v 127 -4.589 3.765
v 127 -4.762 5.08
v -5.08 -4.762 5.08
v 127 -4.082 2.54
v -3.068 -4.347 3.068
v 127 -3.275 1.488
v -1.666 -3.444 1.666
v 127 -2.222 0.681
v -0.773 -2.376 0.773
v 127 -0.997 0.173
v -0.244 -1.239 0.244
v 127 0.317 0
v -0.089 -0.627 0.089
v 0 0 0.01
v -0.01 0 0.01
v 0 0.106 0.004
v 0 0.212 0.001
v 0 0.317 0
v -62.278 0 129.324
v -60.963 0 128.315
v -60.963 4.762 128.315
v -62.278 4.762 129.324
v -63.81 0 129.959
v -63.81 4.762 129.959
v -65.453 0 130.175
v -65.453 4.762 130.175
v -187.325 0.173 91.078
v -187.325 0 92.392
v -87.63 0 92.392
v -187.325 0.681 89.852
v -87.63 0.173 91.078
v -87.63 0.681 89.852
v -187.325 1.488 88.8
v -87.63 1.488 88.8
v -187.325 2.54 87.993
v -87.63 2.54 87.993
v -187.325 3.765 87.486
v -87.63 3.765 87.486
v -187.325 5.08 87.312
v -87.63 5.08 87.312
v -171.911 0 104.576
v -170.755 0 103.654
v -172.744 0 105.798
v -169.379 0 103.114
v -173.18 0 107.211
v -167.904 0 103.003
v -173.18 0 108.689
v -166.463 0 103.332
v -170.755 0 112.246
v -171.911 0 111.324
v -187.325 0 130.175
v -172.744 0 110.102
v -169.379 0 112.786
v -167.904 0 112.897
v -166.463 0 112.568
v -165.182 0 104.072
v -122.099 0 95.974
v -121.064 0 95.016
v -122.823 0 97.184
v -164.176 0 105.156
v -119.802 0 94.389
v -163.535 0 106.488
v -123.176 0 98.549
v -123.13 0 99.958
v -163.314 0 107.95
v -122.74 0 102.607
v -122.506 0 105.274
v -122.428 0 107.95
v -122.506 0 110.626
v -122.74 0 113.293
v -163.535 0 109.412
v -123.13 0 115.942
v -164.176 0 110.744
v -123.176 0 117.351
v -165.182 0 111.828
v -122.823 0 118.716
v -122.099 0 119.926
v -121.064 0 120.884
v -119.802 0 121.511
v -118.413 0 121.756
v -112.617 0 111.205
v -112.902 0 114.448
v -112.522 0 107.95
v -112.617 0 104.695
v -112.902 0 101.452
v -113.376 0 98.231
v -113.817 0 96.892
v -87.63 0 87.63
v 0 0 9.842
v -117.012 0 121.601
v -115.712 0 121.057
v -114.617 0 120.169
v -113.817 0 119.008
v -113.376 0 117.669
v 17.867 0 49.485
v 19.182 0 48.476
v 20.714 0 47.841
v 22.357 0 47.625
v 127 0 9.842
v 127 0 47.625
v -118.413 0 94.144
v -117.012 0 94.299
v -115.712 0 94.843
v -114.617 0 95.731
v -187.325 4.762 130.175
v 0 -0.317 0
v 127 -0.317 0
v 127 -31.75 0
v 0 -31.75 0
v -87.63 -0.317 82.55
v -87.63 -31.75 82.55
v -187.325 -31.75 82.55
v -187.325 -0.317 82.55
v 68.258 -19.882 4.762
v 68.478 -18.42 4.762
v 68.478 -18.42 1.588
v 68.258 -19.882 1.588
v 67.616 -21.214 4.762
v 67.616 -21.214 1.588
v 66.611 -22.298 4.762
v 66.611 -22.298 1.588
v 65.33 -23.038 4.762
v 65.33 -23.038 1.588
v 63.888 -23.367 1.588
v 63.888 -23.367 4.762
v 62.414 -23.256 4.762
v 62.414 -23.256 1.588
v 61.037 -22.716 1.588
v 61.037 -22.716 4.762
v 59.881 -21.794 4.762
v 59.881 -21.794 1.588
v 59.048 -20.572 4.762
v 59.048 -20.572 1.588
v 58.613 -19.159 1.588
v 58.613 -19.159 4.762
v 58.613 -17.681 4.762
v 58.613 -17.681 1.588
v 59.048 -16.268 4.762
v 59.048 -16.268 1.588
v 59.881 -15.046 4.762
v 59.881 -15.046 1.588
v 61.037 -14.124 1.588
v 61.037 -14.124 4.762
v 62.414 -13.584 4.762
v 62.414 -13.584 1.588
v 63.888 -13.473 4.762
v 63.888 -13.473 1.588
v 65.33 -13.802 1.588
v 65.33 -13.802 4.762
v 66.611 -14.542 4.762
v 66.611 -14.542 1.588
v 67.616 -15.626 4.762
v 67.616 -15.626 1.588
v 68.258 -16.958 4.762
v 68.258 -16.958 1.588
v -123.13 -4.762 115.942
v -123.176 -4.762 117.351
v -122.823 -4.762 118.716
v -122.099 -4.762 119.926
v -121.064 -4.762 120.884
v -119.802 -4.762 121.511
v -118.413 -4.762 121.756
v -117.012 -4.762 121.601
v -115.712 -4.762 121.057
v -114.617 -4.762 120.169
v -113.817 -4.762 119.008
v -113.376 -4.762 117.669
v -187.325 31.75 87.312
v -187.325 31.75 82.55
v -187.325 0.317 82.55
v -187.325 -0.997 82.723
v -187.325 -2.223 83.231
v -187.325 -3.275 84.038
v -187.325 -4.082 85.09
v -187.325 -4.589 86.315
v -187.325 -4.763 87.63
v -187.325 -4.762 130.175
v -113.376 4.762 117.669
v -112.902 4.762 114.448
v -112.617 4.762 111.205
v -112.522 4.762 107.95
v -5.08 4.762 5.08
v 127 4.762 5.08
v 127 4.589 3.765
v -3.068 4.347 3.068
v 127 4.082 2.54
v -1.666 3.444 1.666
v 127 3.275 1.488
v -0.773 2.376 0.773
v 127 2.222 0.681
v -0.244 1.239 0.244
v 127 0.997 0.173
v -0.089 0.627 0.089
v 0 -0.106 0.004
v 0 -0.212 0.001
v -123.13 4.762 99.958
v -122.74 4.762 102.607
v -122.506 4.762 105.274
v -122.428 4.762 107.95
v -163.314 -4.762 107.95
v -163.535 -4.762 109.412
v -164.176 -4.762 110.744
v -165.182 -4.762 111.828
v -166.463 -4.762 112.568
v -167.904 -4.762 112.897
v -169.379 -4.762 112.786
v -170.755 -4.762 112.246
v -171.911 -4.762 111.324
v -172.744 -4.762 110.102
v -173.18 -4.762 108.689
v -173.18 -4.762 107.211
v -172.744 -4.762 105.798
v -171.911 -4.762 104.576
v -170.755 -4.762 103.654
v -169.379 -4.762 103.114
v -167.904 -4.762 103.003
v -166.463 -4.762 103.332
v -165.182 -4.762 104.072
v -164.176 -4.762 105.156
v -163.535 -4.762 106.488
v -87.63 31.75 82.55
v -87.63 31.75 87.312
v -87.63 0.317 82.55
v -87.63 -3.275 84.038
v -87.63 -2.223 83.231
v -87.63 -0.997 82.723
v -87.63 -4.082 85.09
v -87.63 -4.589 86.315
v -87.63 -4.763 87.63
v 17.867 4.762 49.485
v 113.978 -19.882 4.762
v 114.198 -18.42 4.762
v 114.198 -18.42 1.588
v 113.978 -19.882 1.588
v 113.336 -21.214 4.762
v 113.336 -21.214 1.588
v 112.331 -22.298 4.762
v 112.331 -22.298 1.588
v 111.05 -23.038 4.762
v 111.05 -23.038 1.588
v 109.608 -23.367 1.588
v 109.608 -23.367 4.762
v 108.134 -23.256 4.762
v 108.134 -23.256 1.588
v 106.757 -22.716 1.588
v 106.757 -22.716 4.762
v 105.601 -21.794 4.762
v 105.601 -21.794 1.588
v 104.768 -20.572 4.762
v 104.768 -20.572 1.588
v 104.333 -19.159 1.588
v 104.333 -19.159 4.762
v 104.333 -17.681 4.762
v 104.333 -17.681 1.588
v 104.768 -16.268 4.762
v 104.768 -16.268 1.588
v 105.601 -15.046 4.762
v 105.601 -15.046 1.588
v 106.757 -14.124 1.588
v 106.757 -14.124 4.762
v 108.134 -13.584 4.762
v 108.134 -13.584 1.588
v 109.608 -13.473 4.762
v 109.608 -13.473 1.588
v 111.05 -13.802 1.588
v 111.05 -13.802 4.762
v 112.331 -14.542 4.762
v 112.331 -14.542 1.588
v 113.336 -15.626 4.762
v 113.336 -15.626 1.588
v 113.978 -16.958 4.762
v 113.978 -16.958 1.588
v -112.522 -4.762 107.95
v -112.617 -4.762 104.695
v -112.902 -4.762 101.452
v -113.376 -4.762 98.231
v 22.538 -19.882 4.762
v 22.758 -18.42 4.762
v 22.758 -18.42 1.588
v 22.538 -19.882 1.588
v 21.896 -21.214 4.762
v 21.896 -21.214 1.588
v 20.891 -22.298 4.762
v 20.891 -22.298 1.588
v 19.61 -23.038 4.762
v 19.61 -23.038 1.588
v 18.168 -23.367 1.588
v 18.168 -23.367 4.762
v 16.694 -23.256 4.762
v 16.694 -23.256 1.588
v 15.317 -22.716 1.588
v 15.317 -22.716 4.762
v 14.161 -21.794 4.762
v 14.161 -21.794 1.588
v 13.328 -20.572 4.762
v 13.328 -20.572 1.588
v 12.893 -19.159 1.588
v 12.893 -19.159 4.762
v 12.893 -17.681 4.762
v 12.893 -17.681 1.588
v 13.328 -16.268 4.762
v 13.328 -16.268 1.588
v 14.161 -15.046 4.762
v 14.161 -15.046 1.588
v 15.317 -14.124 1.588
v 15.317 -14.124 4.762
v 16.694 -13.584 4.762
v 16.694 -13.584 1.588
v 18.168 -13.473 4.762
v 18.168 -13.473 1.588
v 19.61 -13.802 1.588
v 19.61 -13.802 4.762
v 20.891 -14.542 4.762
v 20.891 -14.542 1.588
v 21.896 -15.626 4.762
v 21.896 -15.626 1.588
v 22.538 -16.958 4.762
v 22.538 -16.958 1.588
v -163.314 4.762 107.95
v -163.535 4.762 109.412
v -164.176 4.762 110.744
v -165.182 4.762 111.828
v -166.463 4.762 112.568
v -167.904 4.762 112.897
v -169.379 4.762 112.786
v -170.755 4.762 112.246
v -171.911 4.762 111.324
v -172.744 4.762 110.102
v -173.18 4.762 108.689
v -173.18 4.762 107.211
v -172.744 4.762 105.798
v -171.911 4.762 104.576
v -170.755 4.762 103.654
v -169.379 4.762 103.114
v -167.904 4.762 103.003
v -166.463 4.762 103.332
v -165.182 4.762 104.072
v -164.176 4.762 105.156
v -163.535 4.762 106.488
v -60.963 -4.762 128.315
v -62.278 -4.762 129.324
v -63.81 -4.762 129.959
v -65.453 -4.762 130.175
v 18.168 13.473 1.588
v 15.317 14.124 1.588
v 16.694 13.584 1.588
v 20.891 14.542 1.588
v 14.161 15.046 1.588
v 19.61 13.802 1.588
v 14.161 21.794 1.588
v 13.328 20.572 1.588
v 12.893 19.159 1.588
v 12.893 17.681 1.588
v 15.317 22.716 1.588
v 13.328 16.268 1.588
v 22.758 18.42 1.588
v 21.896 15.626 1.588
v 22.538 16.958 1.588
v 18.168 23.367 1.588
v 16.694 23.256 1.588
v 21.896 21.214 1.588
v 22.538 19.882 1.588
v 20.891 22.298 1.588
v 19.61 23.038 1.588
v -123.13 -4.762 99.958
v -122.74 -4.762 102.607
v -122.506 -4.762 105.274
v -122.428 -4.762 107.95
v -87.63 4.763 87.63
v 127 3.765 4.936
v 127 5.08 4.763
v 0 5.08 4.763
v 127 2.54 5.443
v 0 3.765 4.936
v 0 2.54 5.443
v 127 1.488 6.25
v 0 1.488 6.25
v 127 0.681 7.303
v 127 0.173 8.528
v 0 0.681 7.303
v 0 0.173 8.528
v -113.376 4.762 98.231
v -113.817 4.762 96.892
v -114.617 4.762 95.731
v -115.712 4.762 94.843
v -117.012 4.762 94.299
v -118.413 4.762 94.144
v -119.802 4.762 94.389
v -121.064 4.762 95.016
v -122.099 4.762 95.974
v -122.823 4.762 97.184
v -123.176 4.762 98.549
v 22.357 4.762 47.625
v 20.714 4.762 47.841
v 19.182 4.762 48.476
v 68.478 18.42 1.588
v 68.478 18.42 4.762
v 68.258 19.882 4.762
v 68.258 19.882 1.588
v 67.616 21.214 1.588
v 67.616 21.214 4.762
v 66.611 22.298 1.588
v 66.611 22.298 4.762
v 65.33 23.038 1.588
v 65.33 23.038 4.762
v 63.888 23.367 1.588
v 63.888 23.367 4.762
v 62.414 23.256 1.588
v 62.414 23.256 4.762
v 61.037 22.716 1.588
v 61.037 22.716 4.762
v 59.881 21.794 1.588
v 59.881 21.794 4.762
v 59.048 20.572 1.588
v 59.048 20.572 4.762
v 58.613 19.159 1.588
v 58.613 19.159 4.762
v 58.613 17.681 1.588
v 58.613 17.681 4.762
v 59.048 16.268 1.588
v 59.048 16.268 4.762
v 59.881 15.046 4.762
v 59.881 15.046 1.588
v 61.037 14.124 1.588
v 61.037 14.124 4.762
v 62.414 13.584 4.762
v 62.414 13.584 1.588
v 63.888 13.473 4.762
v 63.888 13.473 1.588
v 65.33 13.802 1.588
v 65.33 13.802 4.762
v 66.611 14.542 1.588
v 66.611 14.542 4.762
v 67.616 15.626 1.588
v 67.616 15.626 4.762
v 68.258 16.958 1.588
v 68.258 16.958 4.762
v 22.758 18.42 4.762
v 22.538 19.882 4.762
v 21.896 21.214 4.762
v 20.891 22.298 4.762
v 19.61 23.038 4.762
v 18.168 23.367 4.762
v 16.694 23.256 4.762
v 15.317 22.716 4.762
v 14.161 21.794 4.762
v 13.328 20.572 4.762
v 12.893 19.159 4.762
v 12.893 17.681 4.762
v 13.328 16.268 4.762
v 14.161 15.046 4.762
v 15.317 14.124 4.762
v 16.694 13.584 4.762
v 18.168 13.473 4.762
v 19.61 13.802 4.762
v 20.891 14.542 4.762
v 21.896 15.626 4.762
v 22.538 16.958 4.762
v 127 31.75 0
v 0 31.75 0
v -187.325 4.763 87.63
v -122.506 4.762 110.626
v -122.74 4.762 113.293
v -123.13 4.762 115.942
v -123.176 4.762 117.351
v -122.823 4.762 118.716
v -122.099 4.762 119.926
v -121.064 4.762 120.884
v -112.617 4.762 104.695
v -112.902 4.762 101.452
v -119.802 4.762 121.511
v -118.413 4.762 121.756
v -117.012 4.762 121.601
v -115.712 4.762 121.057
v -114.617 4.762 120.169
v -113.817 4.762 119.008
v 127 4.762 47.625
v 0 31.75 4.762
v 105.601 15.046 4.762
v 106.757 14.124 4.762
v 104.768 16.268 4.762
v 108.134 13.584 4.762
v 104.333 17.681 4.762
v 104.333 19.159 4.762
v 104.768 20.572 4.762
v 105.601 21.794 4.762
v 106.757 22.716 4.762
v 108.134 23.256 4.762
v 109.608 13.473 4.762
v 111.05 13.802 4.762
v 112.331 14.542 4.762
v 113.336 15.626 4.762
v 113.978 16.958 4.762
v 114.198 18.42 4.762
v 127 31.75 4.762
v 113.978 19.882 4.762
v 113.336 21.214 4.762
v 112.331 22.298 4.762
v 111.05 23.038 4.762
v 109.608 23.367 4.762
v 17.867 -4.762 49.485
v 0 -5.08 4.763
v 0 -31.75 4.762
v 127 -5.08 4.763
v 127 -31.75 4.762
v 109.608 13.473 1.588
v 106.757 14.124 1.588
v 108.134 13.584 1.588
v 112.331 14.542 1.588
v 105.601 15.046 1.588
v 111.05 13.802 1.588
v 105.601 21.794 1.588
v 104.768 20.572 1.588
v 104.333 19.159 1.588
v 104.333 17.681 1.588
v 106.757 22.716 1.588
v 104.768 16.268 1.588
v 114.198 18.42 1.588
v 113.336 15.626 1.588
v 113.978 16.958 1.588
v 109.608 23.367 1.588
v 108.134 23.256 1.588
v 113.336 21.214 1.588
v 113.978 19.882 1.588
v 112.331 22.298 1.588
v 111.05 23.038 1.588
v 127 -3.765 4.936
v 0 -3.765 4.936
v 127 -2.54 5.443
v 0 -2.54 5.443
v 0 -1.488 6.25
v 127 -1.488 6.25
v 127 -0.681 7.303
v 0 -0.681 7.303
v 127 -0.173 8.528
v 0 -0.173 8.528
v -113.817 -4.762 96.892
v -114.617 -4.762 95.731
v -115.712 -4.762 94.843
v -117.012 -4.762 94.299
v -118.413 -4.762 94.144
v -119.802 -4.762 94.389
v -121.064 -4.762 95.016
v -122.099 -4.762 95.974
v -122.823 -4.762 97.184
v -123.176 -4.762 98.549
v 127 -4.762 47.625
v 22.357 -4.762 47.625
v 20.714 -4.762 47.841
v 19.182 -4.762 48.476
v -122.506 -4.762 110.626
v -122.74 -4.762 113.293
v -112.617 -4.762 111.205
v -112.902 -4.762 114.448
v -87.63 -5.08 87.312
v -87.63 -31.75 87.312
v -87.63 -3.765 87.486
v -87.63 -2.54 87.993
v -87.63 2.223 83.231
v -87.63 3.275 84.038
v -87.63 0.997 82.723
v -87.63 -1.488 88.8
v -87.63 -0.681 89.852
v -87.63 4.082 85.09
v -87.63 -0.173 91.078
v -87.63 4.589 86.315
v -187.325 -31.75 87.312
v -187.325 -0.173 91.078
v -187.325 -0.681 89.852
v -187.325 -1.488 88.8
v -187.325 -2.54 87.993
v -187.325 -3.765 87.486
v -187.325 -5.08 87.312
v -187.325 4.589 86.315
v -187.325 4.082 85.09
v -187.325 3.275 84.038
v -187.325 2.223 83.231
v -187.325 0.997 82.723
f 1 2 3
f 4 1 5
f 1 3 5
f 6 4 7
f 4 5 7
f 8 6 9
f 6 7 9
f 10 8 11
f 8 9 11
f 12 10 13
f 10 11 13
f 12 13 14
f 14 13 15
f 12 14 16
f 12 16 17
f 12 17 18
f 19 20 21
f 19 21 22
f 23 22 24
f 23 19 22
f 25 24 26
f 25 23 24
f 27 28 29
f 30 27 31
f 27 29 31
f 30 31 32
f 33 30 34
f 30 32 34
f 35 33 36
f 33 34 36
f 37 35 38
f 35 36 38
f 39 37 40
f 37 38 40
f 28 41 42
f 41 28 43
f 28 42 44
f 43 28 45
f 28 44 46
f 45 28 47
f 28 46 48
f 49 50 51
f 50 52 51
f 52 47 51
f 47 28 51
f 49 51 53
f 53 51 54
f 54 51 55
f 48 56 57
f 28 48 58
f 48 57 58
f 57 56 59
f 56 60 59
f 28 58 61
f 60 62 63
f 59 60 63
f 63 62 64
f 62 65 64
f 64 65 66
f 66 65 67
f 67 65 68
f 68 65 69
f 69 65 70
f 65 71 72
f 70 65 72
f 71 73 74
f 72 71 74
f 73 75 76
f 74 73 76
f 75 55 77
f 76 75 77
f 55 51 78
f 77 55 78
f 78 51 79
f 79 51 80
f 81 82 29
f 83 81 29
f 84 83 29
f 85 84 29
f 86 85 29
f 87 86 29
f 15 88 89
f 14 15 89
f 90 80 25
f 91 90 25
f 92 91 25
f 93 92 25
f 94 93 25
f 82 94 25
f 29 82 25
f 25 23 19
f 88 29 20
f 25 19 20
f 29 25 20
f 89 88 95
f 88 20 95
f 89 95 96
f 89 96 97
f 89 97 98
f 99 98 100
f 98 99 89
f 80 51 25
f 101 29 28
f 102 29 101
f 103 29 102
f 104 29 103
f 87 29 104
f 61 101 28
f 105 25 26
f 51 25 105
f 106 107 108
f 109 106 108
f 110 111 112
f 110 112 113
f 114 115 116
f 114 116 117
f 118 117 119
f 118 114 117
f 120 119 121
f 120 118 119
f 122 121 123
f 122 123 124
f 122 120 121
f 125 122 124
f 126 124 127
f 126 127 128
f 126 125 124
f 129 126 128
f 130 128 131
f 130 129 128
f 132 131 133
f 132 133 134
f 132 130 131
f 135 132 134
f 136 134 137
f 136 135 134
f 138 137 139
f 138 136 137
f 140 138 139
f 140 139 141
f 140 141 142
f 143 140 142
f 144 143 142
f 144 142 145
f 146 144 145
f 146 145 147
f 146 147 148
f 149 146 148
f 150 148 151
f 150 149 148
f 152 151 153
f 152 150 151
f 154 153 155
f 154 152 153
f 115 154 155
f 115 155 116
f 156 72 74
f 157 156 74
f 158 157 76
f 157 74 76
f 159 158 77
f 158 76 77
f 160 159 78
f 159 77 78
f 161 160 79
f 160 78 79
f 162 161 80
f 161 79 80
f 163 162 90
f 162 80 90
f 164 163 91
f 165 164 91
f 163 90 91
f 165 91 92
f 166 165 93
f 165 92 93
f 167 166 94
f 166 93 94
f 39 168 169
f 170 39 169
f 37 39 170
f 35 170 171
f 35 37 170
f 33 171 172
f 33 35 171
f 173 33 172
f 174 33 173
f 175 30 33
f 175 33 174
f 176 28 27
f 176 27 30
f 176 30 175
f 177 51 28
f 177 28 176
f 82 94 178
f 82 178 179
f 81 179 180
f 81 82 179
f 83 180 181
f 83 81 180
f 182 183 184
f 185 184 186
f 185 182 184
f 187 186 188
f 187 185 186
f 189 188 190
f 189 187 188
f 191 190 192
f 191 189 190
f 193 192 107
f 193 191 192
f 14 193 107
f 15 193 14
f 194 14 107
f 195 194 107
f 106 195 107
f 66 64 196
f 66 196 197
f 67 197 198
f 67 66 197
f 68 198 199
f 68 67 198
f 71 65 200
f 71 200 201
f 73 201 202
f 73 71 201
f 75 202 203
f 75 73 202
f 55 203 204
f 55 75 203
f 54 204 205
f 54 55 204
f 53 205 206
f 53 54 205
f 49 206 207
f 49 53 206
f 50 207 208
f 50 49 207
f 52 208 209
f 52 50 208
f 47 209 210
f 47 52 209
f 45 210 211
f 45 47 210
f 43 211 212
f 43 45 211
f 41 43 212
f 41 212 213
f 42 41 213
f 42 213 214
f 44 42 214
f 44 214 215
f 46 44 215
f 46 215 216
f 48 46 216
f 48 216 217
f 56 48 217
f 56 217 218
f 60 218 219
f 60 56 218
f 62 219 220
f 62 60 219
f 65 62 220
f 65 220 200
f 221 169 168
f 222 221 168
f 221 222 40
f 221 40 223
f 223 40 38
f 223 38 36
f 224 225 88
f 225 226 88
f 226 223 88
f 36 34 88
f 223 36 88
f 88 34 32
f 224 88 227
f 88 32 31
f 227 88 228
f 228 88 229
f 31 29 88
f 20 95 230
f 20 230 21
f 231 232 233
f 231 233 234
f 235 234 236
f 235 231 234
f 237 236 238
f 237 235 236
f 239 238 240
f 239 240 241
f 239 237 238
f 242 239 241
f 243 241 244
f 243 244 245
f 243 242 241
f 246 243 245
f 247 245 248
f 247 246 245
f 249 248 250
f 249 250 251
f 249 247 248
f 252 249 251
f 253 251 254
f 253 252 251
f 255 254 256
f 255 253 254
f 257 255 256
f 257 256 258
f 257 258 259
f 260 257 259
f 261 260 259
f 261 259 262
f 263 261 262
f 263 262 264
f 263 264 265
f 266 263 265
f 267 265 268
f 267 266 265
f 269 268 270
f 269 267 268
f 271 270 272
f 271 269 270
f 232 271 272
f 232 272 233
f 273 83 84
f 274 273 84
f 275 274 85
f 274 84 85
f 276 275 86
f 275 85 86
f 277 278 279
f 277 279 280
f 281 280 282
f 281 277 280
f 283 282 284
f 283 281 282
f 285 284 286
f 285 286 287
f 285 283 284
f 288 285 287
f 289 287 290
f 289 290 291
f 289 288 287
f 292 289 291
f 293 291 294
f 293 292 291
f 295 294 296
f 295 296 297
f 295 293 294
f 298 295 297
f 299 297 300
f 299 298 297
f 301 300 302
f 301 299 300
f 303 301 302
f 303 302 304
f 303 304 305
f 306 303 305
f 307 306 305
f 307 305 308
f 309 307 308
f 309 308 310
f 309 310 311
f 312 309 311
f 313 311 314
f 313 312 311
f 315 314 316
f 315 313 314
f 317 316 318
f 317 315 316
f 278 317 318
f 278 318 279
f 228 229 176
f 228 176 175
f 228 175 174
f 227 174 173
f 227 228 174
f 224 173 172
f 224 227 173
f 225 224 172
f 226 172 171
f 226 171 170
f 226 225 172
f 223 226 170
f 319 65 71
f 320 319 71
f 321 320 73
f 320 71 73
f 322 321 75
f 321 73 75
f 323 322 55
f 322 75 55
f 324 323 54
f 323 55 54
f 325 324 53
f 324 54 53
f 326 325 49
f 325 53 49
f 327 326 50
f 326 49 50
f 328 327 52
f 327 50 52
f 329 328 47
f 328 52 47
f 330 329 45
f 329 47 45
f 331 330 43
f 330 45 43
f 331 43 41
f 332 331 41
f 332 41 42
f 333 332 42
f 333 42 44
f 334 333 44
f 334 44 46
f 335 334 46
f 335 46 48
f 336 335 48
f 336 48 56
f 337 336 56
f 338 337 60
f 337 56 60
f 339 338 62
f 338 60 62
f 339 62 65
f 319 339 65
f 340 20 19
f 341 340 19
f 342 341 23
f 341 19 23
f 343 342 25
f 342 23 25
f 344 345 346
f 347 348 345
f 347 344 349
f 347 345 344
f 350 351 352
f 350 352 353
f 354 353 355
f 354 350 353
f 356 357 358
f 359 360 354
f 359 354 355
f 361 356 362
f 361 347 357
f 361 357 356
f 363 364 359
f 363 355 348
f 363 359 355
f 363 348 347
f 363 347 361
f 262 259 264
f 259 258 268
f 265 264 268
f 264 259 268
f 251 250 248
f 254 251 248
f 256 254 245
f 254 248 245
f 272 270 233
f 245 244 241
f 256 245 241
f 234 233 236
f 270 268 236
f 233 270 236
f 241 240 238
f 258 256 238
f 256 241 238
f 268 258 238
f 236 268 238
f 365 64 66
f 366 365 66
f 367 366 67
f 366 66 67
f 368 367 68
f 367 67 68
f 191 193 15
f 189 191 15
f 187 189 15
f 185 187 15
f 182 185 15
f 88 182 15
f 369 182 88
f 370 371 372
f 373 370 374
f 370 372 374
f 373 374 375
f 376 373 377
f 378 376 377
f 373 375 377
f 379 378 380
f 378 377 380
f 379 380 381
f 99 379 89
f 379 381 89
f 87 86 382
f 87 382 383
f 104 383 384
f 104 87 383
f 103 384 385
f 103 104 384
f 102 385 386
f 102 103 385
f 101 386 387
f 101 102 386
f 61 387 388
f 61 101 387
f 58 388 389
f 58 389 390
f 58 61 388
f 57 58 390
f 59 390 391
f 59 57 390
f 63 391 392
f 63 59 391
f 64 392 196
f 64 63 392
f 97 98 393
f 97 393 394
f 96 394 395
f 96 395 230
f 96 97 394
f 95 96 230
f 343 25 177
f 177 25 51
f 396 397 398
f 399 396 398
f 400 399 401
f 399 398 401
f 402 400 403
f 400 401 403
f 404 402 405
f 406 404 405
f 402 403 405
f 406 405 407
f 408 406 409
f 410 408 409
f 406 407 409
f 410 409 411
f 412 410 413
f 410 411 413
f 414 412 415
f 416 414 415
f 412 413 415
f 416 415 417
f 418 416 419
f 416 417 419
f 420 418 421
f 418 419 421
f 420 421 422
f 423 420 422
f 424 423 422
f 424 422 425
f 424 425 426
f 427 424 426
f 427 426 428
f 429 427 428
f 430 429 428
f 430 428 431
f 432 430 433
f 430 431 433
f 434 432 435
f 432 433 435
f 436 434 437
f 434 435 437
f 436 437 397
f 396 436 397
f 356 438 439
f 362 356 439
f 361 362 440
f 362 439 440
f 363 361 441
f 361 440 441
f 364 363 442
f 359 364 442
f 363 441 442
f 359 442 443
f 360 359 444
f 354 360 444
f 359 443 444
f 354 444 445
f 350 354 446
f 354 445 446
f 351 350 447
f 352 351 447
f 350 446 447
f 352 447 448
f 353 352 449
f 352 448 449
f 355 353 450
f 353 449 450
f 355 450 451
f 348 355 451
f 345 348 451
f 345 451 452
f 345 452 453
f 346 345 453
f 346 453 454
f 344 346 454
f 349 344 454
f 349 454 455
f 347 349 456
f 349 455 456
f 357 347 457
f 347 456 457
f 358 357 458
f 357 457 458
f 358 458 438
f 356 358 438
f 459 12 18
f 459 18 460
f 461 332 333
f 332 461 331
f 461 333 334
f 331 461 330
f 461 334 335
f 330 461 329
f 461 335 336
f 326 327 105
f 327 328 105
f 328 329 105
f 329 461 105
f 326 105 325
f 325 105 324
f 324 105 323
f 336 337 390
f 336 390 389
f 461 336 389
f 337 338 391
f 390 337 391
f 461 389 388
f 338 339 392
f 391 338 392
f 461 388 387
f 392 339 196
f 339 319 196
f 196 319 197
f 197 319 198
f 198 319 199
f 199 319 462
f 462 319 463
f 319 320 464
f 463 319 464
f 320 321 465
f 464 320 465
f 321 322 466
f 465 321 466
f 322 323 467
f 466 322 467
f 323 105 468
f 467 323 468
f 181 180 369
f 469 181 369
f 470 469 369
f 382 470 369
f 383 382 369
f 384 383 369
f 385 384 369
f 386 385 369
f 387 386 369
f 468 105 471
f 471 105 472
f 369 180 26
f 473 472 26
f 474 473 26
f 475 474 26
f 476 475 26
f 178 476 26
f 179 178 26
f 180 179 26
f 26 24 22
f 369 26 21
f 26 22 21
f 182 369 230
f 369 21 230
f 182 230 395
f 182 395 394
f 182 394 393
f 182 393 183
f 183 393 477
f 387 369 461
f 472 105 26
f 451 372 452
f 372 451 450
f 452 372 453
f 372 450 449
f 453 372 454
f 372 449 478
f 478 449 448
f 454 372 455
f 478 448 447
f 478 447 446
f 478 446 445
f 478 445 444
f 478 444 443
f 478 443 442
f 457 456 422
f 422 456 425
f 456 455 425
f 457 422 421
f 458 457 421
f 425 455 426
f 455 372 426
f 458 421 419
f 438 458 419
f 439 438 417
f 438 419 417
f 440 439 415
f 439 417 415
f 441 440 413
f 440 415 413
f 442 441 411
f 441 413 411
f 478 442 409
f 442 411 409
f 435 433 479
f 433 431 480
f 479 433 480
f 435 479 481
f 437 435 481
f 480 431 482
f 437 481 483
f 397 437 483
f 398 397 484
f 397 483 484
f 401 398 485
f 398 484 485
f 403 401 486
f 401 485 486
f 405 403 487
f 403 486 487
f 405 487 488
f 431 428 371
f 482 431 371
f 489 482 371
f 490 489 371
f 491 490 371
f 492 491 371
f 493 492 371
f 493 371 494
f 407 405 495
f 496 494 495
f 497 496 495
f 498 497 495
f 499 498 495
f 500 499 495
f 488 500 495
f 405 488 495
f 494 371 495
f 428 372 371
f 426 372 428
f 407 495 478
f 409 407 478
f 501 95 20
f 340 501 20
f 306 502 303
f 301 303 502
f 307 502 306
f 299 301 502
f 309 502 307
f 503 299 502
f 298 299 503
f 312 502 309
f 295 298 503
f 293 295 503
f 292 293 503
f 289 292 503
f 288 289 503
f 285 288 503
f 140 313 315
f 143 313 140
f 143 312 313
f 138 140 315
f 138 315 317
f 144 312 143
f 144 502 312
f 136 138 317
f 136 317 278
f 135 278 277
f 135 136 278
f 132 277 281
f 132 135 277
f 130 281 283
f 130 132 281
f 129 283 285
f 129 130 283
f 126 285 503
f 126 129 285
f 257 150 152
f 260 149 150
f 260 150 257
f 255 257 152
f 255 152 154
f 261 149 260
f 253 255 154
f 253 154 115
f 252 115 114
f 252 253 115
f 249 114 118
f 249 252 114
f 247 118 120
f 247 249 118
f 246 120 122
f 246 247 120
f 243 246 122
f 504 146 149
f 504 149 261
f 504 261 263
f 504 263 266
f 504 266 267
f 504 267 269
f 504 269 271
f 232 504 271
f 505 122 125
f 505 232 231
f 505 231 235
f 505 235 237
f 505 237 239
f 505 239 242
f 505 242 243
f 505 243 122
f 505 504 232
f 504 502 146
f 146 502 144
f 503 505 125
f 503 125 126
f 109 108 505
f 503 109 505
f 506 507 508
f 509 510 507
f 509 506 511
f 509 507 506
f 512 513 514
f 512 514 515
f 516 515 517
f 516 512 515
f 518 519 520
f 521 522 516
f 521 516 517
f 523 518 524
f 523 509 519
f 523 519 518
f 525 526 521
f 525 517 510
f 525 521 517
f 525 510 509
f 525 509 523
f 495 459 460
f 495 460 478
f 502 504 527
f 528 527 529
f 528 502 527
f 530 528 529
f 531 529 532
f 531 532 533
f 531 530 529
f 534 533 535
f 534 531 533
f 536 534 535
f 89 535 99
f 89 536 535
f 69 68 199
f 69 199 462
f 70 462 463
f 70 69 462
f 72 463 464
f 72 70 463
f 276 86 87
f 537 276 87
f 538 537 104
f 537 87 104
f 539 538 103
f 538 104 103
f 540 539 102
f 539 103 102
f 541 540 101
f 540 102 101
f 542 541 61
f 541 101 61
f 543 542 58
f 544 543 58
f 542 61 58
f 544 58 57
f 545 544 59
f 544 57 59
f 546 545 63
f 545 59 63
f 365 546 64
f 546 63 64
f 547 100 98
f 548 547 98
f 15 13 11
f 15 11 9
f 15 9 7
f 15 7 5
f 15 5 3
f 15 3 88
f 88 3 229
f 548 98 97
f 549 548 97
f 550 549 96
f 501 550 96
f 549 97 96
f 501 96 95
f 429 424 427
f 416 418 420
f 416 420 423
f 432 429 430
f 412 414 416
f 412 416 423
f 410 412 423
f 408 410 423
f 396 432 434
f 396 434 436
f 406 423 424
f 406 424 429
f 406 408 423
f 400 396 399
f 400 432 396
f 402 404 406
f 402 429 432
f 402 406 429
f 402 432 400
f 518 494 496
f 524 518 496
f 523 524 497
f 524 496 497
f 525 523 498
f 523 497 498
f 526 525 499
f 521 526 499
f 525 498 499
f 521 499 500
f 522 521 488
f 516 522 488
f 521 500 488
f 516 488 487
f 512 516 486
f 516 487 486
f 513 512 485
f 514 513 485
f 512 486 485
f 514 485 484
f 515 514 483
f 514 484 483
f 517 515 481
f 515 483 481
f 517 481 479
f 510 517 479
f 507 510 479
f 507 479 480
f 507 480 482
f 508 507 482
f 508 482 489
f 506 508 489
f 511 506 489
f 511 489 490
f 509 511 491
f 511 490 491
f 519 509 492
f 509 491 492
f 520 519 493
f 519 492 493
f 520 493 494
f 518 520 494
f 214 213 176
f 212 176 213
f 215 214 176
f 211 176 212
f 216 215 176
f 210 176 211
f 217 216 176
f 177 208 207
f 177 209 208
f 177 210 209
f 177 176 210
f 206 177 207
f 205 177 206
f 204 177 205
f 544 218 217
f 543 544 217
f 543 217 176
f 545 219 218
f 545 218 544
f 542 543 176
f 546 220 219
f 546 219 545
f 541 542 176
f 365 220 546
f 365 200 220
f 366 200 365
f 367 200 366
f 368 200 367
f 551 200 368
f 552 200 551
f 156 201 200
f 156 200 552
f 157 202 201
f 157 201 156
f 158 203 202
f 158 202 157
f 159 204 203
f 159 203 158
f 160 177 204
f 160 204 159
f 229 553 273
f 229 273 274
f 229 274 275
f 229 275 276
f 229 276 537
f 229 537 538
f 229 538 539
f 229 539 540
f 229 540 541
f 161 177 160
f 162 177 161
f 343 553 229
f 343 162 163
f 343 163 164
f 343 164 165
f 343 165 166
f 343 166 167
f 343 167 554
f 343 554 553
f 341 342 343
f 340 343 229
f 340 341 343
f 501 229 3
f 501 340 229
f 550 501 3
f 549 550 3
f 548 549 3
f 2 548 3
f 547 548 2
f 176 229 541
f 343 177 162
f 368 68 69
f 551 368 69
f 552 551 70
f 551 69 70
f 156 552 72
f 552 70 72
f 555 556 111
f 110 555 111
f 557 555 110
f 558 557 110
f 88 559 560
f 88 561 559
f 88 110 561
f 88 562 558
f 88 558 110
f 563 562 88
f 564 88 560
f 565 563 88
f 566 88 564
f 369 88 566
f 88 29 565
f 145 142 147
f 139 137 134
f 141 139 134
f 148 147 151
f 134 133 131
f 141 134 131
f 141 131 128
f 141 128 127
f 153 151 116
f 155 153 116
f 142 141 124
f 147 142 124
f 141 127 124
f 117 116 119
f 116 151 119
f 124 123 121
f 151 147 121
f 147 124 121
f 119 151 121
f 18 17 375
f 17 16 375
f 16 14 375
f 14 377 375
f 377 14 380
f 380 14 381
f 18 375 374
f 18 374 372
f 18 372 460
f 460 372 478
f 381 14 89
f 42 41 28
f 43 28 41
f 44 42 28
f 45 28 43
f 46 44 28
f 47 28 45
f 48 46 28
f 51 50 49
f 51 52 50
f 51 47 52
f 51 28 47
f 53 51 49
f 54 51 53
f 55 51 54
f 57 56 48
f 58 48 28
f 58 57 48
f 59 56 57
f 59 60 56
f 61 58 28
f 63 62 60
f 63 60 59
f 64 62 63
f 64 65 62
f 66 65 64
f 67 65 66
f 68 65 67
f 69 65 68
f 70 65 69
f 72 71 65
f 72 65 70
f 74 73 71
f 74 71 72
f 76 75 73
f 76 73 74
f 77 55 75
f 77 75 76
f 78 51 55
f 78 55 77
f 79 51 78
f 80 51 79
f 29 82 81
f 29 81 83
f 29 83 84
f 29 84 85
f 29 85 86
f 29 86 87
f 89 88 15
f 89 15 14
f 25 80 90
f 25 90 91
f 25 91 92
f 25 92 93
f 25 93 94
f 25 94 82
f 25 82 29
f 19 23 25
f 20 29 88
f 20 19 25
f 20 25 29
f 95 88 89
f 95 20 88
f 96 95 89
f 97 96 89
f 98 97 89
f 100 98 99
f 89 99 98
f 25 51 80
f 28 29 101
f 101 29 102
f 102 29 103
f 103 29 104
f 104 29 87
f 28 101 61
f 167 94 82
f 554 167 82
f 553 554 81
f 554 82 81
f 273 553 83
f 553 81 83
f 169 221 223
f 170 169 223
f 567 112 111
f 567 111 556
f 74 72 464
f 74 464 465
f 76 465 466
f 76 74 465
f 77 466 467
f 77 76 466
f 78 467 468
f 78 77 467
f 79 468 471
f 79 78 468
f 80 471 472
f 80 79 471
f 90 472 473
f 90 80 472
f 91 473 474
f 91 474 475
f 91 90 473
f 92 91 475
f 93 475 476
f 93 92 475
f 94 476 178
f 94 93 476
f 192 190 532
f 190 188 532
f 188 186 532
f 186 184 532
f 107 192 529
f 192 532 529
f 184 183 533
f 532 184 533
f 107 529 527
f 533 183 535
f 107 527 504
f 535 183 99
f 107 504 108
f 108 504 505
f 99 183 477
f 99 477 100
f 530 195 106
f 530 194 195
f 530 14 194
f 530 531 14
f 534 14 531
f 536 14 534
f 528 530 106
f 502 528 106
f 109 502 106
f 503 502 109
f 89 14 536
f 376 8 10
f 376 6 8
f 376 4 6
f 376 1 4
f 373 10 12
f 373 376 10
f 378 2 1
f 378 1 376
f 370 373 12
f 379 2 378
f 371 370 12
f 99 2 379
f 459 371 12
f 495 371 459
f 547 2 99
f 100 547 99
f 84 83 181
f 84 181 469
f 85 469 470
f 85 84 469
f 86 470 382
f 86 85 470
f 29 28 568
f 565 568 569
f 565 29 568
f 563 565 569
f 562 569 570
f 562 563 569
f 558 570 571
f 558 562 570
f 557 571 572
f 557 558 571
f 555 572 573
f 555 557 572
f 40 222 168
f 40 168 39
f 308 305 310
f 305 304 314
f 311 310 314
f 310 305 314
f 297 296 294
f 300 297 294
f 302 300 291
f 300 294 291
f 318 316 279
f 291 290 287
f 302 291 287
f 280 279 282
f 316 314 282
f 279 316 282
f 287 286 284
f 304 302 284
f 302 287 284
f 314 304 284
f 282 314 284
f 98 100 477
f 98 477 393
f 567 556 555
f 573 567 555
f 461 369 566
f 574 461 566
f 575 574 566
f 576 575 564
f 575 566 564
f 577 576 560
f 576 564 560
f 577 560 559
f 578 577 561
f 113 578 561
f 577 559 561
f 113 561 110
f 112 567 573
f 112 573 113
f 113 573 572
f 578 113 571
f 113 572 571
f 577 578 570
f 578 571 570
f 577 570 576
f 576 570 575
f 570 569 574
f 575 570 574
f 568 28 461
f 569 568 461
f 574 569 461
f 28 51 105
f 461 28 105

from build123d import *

# Parameters (mm, degrees)
F0_R        = 4.96062
F1_DEPTH    = 4.7625
F2_W        = 31.75
F2_H        = 4.7625
F3_DEPTH    = 127
F4_T1_DEPTH = 127
F4_T3_DEPTH = 152.4
F5_R        = 4.96062
F6_DEPTH    = 3.175
F7_W        = 31.75
F7_H        = 4.7625
F8_DEPTH    = 99.695
F9_R        = 5.08
F11_DEPTH   = 25.4


# Not quite as in the source:
# - a fillet or chamfer that OpenCascade refuses, or shapes differently, is made with other operations: its cross-section is extruded or revolved along the edge and cut away or added


with BuildPart() as f1:
    # F0 (on Front) → F1 (new body)
    with BuildSketch(Plane.XZ):
        with BuildLine():
            Line((-82.55, 82.55), (0, 0))
            Line((0, 0), (127, 0))
            Line((127, 0), (127, 47.625))
            Line((127, 47.625), (22.3571770291, 47.625))
            ThreePointArc((22.3571770291, 47.625), (19.9271372336, 48.1083649686), (17.8670489686, 49.4848719395))
            Line((17.8670489686, 49.4848719395), (-60.9632071525, 128.3151280605))
            ThreePointArc((-60.9632071525, 128.3151280605), (-63.0232954175, 129.6916350314), (-65.4533352131, 130.175))
            Line((-65.4533352131, 130.175), (-187.325, 130.175))
            Line((-187.325, 130.175), (-187.325, 82.55))
            Line((-187.325, 82.55), (-82.55, 82.55))
        make_face()
        with Locations((-168.275, 107.95)):
            Circle(F0_R, mode=Mode.SUBTRACT)
        with BuildLine():
            ThreePointArc((-113.3757178125, 117.6693530802), (-112.7358395418, 112.8283875), (-112.522, 107.95))
            ThreePointArc((-112.522, 107.95), (-112.7358395418, 103.0716125), (-113.3757178125, 98.2306469198))
            ThreePointArc((-113.3757178125, 98.2306469198), (-119.1163255014, 94.2169402337), (-123.1300321875, 99.9575479227))
            ThreePointArc((-123.1300321875, 99.9575479227), (-122.6038452724, 103.9383875), (-122.428, 107.95))
            ThreePointArc((-122.428, 107.95), (-122.6038452724, 111.9616125), (-123.1300321875, 115.9424520773))
            ThreePointArc((-123.1300321875, 115.9424520773), (-119.1163255014, 121.6830597663), (-113.3757178125, 117.6693530802))
        make_face(mode=Mode.SUBTRACT)
    extrude(amount=F1_DEPTH)

    # F2 (on face) → F3 (join)
    with BuildSketch(Plane.YZ.offset(127)):
        with Locations((15.875, 2.38125)):
            Rectangle(F2_W, F2_H)
    extrude(amount=-F3_DEPTH)

    # F4: fillet of radius 5.08 on 2 edges, made by hand

    # F4_s2 → F4_t1 (join)
    with BuildSketch(Plane.YZ):
        with BuildLine():
            ThreePointArc((5.08, 4.7625), (1.4878975516, 6.2503975516), (0, 9.8425))
            Line((0, 9.8425), (0, 4.7625))
            Line((0, 4.7625), (5.08, 4.7625))
        make_face()
    extrude(amount=F4_T1_DEPTH)

    # F4_s4 → F4_t3 (cut)
    with BuildSketch(Plane.YZ.offset(-12.7)):
        with BuildLine():
            ThreePointArc((-4.7625, 5.08), (-3.2746024484, 1.4878975516), (0.3175, 0))
            Line((0.3175, 0), (-4.7625, 0))
            Line((-4.7625, 0), (-4.7625, 5.08))
        make_face()
    extrude(amount=F4_T3_DEPTH, mode=Mode.SUBTRACT)

    # F5 (on face) → F6 (cut)
    with BuildSketch(Plane.XY.offset(4.7625)):
        with Locations((17.79778, 18.42008)):
            Circle(F5_R)
        with Locations((63.51778, 18.42008)):
            Circle(F5_R)
        with Locations((109.23778, 18.42008)):
            Circle(F5_R)
    extrude(amount=-F6_DEPTH, mode=Mode.SUBTRACT)

    # F7 (on face) → F8 (join)
    with BuildSketch(Plane(origin=(-187.325, 0, 0), x_dir=(0, -1, 0), z_dir=(-1, 0, 0))):
        with Locations((-15.875, 84.93125)):
            Rectangle(F7_W, F7_H)
    extrude(amount=-F8_DEPTH)

    # F9
    f9_edges = [f1.edges().sort_by_distance(p)[0] for p in [
        (-134.9375, -4.7625, 82.55),
        (-137.4775, 0, 87.3125),
    ]]
    fillet(f9_edges, radius=F9_R)

    # F10 (on face) → F11 (cut)
    with BuildSketch(Plane.XZ.offset(4.7625)):
        Polygon((-82.5599315833, 82.5599315833), (-87.63, 87.63), (-87.63, 82.5599315833), align=None)
    extrude(amount=-F11_DEPTH, mode=Mode.SUBTRACT)


with BuildPart() as f12_1:
    # F12: instance of F1
    add(f1.part.mirror(Plane.XZ))


solid = Compound([f1.part, f12_1.part])
